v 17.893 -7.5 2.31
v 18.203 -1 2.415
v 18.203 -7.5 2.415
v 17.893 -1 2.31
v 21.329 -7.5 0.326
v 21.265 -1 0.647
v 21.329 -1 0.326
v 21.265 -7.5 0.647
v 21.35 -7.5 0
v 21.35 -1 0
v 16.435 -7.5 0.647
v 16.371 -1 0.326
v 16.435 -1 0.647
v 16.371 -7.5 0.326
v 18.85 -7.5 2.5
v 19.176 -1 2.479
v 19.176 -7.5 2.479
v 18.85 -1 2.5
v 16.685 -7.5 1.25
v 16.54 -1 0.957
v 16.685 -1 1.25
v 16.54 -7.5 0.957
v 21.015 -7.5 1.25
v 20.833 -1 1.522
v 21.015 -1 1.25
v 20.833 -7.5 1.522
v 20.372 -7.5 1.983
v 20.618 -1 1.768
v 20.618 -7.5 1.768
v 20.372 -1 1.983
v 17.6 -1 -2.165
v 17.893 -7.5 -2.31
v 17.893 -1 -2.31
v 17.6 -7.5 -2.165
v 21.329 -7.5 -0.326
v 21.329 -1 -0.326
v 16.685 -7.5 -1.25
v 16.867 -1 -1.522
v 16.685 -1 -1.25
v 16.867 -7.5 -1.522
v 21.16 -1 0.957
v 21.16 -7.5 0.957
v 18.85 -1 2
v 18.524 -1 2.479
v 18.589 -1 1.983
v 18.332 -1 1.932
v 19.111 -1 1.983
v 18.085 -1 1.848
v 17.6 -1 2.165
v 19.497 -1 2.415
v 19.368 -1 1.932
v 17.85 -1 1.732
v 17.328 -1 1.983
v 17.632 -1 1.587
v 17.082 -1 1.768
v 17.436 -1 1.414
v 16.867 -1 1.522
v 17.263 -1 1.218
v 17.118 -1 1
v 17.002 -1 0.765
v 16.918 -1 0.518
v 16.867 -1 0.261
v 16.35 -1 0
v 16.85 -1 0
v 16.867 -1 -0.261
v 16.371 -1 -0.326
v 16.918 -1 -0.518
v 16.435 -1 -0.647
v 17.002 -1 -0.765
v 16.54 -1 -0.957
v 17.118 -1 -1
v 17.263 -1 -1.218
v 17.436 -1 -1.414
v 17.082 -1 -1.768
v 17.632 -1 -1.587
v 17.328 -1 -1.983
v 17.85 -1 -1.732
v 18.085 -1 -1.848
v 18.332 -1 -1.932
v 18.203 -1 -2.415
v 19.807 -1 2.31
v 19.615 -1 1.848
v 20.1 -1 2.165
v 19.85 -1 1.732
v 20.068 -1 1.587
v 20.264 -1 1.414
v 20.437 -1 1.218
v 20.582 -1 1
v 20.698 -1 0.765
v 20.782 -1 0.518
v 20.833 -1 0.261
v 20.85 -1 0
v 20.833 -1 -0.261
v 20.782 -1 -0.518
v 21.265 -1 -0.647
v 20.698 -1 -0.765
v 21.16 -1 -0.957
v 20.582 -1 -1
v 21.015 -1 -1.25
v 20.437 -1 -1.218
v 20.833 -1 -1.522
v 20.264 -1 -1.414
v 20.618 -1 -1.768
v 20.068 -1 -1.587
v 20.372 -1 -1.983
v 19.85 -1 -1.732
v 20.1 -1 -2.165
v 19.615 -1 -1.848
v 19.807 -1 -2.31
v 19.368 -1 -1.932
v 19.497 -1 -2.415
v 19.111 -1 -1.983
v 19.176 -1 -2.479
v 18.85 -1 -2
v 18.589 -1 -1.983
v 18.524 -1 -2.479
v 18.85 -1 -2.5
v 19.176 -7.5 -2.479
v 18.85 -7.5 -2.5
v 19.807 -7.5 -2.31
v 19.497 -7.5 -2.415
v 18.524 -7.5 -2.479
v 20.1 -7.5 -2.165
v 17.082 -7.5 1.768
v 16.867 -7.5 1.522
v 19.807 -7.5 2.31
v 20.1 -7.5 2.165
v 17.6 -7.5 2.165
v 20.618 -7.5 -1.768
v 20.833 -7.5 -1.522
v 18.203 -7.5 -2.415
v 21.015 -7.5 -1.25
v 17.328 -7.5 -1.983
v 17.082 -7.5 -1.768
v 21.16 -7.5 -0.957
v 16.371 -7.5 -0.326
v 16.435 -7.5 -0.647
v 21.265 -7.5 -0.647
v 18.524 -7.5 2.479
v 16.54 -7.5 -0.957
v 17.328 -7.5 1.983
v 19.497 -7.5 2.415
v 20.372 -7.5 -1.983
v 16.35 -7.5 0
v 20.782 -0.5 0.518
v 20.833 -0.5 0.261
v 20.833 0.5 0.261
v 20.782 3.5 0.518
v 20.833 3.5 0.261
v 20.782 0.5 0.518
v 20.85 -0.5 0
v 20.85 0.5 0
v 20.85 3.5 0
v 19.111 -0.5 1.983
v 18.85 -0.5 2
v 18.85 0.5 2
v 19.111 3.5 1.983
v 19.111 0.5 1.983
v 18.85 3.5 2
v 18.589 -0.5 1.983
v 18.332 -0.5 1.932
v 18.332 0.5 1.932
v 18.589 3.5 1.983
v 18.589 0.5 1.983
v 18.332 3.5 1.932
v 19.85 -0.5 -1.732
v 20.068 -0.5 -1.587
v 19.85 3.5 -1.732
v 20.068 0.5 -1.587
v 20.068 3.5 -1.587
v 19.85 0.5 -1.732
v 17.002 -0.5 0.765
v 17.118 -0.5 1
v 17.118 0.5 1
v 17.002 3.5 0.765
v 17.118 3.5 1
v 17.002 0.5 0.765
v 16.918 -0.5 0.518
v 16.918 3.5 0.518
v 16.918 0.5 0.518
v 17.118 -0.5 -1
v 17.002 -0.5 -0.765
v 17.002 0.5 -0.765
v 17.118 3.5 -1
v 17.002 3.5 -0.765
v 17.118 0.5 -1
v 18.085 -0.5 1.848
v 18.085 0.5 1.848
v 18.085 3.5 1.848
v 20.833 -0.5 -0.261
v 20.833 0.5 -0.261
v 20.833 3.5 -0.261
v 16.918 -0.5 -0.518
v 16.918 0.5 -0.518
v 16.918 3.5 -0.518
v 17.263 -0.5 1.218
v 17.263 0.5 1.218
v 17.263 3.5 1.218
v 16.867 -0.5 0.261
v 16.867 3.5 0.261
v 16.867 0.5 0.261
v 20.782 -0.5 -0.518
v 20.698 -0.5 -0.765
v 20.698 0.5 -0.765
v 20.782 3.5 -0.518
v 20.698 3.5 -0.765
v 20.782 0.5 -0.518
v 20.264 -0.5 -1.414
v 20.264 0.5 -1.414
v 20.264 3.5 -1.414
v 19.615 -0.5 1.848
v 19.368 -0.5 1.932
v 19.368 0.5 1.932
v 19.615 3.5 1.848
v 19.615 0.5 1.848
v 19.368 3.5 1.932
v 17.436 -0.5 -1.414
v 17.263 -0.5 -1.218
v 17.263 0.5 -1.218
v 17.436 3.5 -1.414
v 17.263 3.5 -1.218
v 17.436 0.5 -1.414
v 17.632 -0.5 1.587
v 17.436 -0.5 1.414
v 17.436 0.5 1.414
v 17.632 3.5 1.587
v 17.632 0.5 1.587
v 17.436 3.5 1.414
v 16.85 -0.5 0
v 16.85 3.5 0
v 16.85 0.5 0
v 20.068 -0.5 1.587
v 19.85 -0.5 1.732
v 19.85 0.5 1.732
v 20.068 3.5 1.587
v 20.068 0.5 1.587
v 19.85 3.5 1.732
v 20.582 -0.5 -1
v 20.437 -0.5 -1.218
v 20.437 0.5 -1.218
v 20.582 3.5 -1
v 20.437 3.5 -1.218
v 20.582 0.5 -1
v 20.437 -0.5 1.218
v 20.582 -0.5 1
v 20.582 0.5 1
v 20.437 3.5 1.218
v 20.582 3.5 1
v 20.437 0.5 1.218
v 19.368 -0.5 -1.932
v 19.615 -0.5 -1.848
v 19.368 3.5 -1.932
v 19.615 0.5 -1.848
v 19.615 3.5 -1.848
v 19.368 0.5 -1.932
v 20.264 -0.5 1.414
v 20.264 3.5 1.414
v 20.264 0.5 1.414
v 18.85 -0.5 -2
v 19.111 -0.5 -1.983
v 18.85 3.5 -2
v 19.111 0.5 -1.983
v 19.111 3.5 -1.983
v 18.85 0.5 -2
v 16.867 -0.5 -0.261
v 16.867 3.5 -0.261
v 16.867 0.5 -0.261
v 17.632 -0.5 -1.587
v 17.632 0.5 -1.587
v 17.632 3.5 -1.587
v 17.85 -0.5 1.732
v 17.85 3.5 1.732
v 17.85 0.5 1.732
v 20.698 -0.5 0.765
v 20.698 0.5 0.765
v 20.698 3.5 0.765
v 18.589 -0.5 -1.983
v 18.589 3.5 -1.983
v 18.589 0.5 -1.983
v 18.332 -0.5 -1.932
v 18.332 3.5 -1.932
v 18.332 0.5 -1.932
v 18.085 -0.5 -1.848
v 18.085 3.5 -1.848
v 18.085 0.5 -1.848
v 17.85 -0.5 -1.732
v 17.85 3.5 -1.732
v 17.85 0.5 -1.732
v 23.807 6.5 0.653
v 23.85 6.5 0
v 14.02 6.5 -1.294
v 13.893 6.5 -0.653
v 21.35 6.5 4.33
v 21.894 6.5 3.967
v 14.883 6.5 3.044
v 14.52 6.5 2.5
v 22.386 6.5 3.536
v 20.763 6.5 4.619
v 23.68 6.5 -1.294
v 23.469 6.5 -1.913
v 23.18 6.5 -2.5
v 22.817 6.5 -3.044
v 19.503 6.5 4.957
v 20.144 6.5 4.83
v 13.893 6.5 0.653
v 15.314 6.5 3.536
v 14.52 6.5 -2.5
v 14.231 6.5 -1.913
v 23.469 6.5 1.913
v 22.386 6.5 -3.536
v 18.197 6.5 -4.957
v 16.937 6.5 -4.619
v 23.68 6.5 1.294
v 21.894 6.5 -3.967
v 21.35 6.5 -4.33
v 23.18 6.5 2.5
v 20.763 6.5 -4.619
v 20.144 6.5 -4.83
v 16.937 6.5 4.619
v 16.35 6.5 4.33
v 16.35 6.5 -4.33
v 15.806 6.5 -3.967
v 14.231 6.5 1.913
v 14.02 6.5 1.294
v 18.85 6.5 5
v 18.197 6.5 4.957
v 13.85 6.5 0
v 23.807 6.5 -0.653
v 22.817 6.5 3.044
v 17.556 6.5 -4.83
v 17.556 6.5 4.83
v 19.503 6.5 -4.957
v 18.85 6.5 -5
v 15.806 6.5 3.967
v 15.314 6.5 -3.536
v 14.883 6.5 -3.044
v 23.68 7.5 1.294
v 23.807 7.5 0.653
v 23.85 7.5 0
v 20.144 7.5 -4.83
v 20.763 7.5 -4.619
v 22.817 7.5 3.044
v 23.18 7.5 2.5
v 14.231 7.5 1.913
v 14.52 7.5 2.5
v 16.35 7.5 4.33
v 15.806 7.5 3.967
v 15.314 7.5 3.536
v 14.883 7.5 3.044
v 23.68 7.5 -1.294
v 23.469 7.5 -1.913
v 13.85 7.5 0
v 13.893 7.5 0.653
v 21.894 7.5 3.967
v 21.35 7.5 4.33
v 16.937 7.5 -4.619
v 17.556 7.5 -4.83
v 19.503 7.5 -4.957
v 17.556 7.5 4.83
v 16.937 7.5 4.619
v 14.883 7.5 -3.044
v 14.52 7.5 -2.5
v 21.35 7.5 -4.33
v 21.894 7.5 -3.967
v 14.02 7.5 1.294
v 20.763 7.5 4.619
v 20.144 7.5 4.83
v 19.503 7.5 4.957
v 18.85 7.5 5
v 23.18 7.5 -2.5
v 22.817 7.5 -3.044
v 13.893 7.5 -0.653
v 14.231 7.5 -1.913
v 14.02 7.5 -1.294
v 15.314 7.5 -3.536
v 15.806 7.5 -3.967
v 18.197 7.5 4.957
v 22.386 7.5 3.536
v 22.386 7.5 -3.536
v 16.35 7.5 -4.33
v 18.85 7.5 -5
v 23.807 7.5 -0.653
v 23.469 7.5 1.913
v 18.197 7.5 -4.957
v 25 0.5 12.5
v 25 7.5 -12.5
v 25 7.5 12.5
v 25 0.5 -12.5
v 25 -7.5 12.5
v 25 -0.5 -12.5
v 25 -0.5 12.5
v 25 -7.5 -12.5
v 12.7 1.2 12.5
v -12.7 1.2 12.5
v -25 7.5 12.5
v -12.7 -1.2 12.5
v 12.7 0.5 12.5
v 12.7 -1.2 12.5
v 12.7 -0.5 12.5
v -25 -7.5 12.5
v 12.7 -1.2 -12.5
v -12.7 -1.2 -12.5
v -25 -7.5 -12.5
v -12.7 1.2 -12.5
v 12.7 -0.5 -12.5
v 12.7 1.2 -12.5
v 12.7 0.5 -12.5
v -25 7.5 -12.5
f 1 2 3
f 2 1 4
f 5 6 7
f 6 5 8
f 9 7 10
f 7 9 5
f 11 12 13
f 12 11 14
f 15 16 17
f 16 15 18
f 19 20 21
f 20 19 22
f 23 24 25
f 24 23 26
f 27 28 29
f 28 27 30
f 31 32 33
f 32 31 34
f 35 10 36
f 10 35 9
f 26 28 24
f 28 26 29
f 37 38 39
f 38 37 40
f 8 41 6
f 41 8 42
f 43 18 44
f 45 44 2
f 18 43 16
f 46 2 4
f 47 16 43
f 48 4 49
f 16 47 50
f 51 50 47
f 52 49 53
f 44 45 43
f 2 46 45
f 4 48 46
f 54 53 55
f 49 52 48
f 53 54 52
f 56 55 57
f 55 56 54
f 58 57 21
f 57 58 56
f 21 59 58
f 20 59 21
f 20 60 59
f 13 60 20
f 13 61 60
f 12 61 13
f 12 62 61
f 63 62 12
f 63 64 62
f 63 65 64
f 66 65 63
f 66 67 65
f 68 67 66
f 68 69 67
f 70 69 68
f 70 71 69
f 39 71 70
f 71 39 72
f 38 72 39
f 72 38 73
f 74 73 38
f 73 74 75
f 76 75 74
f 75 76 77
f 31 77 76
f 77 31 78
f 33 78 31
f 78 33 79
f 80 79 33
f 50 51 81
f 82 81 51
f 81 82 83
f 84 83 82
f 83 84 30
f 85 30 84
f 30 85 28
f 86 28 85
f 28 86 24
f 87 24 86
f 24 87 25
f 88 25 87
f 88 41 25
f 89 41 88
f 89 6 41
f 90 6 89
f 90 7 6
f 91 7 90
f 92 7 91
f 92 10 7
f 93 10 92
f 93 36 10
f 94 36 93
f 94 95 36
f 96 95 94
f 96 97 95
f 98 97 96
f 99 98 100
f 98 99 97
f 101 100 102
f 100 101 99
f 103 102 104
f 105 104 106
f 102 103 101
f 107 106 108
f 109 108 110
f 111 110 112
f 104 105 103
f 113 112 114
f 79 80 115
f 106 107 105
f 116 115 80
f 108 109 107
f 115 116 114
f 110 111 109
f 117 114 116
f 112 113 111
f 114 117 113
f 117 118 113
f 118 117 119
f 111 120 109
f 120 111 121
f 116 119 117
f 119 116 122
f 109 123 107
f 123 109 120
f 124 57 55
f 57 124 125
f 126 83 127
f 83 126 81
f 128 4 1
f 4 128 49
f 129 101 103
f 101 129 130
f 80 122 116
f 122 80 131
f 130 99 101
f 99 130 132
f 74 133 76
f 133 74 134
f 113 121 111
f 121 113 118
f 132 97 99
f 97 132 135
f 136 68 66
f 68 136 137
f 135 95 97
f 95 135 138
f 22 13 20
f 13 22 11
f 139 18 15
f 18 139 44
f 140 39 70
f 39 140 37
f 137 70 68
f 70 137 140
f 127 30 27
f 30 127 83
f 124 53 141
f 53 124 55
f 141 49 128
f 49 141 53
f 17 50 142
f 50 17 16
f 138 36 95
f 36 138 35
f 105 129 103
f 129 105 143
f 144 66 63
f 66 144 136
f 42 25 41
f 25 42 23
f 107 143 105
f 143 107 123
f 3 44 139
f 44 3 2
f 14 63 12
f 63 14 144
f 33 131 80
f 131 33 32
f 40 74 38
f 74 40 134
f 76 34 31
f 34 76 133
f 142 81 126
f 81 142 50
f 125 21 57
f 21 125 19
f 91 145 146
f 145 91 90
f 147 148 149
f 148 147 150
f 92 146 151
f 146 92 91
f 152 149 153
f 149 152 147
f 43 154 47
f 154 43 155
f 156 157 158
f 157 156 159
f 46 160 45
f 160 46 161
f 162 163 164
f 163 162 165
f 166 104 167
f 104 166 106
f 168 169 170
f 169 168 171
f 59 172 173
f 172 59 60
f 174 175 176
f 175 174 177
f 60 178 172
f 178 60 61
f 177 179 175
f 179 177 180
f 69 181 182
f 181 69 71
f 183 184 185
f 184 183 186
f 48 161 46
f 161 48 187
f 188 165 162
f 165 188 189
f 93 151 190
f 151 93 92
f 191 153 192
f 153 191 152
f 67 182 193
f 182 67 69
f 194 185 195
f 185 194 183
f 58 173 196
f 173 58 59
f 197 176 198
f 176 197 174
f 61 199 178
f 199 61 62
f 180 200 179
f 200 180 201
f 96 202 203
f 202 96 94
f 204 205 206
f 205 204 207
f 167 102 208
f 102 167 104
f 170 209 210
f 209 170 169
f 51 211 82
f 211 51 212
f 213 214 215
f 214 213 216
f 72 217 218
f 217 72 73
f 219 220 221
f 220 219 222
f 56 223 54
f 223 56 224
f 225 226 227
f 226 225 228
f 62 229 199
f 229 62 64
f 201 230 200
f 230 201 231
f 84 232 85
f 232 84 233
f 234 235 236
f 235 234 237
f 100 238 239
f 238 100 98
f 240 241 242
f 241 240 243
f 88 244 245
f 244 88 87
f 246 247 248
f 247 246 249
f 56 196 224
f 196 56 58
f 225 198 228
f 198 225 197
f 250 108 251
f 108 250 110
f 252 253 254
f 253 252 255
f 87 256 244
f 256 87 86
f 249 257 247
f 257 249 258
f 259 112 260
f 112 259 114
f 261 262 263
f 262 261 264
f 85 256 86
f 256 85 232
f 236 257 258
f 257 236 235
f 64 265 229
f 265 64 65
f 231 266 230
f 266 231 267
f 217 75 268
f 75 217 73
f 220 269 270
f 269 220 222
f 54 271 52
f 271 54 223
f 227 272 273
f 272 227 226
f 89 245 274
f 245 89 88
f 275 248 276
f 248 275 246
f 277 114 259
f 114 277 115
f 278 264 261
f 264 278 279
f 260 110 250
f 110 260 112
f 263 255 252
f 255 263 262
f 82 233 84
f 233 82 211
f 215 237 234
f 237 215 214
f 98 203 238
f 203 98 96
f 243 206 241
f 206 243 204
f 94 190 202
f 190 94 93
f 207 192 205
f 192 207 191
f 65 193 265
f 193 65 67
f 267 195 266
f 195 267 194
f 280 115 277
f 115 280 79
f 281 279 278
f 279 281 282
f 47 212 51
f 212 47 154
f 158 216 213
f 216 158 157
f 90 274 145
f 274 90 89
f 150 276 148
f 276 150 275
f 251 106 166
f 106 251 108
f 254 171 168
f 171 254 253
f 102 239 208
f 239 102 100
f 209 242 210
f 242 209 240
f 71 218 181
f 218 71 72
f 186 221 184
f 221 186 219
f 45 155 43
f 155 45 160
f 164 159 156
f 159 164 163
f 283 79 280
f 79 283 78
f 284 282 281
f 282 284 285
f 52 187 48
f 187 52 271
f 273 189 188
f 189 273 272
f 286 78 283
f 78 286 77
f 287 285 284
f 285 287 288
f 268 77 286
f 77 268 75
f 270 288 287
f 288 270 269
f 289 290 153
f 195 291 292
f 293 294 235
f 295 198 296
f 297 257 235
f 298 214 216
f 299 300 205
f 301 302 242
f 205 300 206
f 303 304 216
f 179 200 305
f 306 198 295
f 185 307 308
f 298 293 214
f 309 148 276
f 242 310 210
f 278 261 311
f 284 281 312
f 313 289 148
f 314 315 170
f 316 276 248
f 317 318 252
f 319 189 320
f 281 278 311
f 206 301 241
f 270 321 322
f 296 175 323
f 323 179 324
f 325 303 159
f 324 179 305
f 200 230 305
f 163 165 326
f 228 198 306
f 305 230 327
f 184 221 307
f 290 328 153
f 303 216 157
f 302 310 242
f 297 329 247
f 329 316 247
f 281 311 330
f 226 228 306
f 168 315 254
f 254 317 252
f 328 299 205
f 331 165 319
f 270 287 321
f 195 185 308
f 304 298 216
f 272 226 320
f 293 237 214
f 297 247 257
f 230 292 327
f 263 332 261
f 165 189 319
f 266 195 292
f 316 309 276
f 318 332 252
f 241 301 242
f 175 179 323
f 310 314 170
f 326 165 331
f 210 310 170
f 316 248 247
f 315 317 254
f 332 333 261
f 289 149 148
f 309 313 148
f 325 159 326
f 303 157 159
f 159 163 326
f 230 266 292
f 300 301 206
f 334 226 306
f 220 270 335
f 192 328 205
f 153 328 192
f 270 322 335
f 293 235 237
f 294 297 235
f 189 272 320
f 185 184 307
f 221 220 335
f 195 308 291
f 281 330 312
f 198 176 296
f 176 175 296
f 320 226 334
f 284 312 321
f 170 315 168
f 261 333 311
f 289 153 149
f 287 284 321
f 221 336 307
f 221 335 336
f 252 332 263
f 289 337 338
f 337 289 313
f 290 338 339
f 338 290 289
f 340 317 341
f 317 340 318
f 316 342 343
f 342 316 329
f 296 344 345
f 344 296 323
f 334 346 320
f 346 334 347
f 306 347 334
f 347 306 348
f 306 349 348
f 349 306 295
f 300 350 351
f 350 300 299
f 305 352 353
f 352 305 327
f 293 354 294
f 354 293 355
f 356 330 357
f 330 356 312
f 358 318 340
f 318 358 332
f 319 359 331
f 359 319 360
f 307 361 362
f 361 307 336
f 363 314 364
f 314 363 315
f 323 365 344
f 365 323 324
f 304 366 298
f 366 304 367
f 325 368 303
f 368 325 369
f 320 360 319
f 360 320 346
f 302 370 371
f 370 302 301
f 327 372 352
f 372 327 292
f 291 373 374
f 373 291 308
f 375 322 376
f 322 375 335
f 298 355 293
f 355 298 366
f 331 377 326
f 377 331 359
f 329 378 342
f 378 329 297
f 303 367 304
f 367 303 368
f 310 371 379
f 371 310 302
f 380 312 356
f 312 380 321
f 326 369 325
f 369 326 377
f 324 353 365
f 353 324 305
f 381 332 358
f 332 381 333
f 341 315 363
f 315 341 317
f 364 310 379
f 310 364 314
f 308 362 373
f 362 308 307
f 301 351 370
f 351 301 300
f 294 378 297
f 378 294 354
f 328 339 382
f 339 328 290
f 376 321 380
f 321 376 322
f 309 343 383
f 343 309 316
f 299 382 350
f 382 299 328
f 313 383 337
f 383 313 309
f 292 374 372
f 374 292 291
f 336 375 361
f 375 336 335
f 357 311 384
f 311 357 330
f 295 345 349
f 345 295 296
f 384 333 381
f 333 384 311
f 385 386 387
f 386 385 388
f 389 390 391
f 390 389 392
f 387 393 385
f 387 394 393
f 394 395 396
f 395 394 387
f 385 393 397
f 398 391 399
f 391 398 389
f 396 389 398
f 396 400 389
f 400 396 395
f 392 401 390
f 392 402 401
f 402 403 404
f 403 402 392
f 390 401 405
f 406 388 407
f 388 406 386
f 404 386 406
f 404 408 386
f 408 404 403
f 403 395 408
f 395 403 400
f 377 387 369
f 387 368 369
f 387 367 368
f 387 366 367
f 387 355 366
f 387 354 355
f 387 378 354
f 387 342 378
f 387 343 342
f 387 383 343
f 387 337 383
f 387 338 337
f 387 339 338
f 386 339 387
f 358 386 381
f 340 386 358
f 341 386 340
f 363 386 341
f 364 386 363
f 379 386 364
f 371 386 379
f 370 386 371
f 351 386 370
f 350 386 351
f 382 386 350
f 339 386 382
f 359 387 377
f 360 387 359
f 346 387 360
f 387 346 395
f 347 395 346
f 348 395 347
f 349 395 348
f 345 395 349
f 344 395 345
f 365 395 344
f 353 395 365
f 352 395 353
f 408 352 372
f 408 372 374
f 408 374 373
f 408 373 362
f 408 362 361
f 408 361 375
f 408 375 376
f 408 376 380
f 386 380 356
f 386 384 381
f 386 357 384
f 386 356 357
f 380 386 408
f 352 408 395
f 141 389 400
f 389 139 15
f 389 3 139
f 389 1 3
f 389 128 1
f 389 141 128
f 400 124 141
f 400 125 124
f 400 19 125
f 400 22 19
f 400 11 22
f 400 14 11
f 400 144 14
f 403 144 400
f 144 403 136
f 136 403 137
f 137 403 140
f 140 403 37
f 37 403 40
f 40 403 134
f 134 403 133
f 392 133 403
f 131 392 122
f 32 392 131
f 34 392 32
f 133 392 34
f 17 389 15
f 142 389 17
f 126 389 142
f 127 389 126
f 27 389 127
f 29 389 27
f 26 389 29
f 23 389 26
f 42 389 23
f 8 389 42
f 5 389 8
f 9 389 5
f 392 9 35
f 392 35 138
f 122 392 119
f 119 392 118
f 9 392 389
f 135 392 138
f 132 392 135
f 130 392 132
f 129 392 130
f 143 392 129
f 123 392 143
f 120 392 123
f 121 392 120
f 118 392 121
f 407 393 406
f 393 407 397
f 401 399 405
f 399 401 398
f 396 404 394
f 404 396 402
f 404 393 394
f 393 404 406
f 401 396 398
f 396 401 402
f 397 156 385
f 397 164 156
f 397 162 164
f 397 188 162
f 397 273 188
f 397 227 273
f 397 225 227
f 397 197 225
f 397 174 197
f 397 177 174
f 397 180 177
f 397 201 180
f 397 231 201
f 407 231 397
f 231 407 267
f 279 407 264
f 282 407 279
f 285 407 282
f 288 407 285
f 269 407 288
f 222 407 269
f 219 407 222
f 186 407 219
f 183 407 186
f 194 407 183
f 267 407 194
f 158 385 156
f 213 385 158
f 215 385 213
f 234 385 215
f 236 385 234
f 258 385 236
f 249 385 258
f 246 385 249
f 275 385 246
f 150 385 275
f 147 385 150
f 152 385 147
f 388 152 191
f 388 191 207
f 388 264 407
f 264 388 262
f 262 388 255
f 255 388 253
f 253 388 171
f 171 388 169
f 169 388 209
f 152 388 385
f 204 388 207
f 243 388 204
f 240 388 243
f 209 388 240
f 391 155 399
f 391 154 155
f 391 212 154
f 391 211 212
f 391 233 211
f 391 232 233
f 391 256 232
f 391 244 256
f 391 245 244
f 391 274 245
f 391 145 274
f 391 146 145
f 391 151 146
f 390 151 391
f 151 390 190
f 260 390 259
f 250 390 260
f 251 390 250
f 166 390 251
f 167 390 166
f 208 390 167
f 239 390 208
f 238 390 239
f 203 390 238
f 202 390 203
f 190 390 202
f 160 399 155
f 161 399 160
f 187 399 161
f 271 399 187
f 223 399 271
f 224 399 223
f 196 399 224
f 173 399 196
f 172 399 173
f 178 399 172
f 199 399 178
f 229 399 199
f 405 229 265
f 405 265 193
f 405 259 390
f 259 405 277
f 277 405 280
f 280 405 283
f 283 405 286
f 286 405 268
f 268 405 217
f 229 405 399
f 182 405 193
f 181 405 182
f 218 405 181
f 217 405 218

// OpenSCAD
/* [Overall Size] */
thickness = 15; // [10:30]
width = 50;  // [45:90]
depth = 25;  // [15:50]

/* [Ruler Size] */
ruler_width = 25.4; // [10:40]
ruler_thickness = 2.4; // [1:5]

/* [bolt_size]*/
bolt_dia = 4;  // [3:6]
bolt_head = 10; // [8:12]

/* [Hidden] */
$fn=48;


difference() {
    br = bolt_dia /2;
    hr = bolt_head /2;
    t = .5; // thread allowance
    
    //overall dimensions
    cube([width, thickness, depth], center = true);
    
    //slot for ruler
    cube([ruler_width, ruler_thickness, depth+.1], center = true);
    
    //1mm slot to clamp with
    translate([width/4,0,0]) 
        cube([width/2+.1,1,depth+.1], center = true);

    //screw shank and head
    translate([(ruler_width+width)/4,-1,0]) rotate([90,0,0]){
        cylinder(10, br+t, br+t);
        translate([0,0,-thickness/2]) cylinder(thickness/2, br, br);
        translate([0,0,-thickness/2]) cylinder(3, hr, br);
        translate([0,0,-3-thickness/2]) cylinder(3, hr, hr);
    }
}
